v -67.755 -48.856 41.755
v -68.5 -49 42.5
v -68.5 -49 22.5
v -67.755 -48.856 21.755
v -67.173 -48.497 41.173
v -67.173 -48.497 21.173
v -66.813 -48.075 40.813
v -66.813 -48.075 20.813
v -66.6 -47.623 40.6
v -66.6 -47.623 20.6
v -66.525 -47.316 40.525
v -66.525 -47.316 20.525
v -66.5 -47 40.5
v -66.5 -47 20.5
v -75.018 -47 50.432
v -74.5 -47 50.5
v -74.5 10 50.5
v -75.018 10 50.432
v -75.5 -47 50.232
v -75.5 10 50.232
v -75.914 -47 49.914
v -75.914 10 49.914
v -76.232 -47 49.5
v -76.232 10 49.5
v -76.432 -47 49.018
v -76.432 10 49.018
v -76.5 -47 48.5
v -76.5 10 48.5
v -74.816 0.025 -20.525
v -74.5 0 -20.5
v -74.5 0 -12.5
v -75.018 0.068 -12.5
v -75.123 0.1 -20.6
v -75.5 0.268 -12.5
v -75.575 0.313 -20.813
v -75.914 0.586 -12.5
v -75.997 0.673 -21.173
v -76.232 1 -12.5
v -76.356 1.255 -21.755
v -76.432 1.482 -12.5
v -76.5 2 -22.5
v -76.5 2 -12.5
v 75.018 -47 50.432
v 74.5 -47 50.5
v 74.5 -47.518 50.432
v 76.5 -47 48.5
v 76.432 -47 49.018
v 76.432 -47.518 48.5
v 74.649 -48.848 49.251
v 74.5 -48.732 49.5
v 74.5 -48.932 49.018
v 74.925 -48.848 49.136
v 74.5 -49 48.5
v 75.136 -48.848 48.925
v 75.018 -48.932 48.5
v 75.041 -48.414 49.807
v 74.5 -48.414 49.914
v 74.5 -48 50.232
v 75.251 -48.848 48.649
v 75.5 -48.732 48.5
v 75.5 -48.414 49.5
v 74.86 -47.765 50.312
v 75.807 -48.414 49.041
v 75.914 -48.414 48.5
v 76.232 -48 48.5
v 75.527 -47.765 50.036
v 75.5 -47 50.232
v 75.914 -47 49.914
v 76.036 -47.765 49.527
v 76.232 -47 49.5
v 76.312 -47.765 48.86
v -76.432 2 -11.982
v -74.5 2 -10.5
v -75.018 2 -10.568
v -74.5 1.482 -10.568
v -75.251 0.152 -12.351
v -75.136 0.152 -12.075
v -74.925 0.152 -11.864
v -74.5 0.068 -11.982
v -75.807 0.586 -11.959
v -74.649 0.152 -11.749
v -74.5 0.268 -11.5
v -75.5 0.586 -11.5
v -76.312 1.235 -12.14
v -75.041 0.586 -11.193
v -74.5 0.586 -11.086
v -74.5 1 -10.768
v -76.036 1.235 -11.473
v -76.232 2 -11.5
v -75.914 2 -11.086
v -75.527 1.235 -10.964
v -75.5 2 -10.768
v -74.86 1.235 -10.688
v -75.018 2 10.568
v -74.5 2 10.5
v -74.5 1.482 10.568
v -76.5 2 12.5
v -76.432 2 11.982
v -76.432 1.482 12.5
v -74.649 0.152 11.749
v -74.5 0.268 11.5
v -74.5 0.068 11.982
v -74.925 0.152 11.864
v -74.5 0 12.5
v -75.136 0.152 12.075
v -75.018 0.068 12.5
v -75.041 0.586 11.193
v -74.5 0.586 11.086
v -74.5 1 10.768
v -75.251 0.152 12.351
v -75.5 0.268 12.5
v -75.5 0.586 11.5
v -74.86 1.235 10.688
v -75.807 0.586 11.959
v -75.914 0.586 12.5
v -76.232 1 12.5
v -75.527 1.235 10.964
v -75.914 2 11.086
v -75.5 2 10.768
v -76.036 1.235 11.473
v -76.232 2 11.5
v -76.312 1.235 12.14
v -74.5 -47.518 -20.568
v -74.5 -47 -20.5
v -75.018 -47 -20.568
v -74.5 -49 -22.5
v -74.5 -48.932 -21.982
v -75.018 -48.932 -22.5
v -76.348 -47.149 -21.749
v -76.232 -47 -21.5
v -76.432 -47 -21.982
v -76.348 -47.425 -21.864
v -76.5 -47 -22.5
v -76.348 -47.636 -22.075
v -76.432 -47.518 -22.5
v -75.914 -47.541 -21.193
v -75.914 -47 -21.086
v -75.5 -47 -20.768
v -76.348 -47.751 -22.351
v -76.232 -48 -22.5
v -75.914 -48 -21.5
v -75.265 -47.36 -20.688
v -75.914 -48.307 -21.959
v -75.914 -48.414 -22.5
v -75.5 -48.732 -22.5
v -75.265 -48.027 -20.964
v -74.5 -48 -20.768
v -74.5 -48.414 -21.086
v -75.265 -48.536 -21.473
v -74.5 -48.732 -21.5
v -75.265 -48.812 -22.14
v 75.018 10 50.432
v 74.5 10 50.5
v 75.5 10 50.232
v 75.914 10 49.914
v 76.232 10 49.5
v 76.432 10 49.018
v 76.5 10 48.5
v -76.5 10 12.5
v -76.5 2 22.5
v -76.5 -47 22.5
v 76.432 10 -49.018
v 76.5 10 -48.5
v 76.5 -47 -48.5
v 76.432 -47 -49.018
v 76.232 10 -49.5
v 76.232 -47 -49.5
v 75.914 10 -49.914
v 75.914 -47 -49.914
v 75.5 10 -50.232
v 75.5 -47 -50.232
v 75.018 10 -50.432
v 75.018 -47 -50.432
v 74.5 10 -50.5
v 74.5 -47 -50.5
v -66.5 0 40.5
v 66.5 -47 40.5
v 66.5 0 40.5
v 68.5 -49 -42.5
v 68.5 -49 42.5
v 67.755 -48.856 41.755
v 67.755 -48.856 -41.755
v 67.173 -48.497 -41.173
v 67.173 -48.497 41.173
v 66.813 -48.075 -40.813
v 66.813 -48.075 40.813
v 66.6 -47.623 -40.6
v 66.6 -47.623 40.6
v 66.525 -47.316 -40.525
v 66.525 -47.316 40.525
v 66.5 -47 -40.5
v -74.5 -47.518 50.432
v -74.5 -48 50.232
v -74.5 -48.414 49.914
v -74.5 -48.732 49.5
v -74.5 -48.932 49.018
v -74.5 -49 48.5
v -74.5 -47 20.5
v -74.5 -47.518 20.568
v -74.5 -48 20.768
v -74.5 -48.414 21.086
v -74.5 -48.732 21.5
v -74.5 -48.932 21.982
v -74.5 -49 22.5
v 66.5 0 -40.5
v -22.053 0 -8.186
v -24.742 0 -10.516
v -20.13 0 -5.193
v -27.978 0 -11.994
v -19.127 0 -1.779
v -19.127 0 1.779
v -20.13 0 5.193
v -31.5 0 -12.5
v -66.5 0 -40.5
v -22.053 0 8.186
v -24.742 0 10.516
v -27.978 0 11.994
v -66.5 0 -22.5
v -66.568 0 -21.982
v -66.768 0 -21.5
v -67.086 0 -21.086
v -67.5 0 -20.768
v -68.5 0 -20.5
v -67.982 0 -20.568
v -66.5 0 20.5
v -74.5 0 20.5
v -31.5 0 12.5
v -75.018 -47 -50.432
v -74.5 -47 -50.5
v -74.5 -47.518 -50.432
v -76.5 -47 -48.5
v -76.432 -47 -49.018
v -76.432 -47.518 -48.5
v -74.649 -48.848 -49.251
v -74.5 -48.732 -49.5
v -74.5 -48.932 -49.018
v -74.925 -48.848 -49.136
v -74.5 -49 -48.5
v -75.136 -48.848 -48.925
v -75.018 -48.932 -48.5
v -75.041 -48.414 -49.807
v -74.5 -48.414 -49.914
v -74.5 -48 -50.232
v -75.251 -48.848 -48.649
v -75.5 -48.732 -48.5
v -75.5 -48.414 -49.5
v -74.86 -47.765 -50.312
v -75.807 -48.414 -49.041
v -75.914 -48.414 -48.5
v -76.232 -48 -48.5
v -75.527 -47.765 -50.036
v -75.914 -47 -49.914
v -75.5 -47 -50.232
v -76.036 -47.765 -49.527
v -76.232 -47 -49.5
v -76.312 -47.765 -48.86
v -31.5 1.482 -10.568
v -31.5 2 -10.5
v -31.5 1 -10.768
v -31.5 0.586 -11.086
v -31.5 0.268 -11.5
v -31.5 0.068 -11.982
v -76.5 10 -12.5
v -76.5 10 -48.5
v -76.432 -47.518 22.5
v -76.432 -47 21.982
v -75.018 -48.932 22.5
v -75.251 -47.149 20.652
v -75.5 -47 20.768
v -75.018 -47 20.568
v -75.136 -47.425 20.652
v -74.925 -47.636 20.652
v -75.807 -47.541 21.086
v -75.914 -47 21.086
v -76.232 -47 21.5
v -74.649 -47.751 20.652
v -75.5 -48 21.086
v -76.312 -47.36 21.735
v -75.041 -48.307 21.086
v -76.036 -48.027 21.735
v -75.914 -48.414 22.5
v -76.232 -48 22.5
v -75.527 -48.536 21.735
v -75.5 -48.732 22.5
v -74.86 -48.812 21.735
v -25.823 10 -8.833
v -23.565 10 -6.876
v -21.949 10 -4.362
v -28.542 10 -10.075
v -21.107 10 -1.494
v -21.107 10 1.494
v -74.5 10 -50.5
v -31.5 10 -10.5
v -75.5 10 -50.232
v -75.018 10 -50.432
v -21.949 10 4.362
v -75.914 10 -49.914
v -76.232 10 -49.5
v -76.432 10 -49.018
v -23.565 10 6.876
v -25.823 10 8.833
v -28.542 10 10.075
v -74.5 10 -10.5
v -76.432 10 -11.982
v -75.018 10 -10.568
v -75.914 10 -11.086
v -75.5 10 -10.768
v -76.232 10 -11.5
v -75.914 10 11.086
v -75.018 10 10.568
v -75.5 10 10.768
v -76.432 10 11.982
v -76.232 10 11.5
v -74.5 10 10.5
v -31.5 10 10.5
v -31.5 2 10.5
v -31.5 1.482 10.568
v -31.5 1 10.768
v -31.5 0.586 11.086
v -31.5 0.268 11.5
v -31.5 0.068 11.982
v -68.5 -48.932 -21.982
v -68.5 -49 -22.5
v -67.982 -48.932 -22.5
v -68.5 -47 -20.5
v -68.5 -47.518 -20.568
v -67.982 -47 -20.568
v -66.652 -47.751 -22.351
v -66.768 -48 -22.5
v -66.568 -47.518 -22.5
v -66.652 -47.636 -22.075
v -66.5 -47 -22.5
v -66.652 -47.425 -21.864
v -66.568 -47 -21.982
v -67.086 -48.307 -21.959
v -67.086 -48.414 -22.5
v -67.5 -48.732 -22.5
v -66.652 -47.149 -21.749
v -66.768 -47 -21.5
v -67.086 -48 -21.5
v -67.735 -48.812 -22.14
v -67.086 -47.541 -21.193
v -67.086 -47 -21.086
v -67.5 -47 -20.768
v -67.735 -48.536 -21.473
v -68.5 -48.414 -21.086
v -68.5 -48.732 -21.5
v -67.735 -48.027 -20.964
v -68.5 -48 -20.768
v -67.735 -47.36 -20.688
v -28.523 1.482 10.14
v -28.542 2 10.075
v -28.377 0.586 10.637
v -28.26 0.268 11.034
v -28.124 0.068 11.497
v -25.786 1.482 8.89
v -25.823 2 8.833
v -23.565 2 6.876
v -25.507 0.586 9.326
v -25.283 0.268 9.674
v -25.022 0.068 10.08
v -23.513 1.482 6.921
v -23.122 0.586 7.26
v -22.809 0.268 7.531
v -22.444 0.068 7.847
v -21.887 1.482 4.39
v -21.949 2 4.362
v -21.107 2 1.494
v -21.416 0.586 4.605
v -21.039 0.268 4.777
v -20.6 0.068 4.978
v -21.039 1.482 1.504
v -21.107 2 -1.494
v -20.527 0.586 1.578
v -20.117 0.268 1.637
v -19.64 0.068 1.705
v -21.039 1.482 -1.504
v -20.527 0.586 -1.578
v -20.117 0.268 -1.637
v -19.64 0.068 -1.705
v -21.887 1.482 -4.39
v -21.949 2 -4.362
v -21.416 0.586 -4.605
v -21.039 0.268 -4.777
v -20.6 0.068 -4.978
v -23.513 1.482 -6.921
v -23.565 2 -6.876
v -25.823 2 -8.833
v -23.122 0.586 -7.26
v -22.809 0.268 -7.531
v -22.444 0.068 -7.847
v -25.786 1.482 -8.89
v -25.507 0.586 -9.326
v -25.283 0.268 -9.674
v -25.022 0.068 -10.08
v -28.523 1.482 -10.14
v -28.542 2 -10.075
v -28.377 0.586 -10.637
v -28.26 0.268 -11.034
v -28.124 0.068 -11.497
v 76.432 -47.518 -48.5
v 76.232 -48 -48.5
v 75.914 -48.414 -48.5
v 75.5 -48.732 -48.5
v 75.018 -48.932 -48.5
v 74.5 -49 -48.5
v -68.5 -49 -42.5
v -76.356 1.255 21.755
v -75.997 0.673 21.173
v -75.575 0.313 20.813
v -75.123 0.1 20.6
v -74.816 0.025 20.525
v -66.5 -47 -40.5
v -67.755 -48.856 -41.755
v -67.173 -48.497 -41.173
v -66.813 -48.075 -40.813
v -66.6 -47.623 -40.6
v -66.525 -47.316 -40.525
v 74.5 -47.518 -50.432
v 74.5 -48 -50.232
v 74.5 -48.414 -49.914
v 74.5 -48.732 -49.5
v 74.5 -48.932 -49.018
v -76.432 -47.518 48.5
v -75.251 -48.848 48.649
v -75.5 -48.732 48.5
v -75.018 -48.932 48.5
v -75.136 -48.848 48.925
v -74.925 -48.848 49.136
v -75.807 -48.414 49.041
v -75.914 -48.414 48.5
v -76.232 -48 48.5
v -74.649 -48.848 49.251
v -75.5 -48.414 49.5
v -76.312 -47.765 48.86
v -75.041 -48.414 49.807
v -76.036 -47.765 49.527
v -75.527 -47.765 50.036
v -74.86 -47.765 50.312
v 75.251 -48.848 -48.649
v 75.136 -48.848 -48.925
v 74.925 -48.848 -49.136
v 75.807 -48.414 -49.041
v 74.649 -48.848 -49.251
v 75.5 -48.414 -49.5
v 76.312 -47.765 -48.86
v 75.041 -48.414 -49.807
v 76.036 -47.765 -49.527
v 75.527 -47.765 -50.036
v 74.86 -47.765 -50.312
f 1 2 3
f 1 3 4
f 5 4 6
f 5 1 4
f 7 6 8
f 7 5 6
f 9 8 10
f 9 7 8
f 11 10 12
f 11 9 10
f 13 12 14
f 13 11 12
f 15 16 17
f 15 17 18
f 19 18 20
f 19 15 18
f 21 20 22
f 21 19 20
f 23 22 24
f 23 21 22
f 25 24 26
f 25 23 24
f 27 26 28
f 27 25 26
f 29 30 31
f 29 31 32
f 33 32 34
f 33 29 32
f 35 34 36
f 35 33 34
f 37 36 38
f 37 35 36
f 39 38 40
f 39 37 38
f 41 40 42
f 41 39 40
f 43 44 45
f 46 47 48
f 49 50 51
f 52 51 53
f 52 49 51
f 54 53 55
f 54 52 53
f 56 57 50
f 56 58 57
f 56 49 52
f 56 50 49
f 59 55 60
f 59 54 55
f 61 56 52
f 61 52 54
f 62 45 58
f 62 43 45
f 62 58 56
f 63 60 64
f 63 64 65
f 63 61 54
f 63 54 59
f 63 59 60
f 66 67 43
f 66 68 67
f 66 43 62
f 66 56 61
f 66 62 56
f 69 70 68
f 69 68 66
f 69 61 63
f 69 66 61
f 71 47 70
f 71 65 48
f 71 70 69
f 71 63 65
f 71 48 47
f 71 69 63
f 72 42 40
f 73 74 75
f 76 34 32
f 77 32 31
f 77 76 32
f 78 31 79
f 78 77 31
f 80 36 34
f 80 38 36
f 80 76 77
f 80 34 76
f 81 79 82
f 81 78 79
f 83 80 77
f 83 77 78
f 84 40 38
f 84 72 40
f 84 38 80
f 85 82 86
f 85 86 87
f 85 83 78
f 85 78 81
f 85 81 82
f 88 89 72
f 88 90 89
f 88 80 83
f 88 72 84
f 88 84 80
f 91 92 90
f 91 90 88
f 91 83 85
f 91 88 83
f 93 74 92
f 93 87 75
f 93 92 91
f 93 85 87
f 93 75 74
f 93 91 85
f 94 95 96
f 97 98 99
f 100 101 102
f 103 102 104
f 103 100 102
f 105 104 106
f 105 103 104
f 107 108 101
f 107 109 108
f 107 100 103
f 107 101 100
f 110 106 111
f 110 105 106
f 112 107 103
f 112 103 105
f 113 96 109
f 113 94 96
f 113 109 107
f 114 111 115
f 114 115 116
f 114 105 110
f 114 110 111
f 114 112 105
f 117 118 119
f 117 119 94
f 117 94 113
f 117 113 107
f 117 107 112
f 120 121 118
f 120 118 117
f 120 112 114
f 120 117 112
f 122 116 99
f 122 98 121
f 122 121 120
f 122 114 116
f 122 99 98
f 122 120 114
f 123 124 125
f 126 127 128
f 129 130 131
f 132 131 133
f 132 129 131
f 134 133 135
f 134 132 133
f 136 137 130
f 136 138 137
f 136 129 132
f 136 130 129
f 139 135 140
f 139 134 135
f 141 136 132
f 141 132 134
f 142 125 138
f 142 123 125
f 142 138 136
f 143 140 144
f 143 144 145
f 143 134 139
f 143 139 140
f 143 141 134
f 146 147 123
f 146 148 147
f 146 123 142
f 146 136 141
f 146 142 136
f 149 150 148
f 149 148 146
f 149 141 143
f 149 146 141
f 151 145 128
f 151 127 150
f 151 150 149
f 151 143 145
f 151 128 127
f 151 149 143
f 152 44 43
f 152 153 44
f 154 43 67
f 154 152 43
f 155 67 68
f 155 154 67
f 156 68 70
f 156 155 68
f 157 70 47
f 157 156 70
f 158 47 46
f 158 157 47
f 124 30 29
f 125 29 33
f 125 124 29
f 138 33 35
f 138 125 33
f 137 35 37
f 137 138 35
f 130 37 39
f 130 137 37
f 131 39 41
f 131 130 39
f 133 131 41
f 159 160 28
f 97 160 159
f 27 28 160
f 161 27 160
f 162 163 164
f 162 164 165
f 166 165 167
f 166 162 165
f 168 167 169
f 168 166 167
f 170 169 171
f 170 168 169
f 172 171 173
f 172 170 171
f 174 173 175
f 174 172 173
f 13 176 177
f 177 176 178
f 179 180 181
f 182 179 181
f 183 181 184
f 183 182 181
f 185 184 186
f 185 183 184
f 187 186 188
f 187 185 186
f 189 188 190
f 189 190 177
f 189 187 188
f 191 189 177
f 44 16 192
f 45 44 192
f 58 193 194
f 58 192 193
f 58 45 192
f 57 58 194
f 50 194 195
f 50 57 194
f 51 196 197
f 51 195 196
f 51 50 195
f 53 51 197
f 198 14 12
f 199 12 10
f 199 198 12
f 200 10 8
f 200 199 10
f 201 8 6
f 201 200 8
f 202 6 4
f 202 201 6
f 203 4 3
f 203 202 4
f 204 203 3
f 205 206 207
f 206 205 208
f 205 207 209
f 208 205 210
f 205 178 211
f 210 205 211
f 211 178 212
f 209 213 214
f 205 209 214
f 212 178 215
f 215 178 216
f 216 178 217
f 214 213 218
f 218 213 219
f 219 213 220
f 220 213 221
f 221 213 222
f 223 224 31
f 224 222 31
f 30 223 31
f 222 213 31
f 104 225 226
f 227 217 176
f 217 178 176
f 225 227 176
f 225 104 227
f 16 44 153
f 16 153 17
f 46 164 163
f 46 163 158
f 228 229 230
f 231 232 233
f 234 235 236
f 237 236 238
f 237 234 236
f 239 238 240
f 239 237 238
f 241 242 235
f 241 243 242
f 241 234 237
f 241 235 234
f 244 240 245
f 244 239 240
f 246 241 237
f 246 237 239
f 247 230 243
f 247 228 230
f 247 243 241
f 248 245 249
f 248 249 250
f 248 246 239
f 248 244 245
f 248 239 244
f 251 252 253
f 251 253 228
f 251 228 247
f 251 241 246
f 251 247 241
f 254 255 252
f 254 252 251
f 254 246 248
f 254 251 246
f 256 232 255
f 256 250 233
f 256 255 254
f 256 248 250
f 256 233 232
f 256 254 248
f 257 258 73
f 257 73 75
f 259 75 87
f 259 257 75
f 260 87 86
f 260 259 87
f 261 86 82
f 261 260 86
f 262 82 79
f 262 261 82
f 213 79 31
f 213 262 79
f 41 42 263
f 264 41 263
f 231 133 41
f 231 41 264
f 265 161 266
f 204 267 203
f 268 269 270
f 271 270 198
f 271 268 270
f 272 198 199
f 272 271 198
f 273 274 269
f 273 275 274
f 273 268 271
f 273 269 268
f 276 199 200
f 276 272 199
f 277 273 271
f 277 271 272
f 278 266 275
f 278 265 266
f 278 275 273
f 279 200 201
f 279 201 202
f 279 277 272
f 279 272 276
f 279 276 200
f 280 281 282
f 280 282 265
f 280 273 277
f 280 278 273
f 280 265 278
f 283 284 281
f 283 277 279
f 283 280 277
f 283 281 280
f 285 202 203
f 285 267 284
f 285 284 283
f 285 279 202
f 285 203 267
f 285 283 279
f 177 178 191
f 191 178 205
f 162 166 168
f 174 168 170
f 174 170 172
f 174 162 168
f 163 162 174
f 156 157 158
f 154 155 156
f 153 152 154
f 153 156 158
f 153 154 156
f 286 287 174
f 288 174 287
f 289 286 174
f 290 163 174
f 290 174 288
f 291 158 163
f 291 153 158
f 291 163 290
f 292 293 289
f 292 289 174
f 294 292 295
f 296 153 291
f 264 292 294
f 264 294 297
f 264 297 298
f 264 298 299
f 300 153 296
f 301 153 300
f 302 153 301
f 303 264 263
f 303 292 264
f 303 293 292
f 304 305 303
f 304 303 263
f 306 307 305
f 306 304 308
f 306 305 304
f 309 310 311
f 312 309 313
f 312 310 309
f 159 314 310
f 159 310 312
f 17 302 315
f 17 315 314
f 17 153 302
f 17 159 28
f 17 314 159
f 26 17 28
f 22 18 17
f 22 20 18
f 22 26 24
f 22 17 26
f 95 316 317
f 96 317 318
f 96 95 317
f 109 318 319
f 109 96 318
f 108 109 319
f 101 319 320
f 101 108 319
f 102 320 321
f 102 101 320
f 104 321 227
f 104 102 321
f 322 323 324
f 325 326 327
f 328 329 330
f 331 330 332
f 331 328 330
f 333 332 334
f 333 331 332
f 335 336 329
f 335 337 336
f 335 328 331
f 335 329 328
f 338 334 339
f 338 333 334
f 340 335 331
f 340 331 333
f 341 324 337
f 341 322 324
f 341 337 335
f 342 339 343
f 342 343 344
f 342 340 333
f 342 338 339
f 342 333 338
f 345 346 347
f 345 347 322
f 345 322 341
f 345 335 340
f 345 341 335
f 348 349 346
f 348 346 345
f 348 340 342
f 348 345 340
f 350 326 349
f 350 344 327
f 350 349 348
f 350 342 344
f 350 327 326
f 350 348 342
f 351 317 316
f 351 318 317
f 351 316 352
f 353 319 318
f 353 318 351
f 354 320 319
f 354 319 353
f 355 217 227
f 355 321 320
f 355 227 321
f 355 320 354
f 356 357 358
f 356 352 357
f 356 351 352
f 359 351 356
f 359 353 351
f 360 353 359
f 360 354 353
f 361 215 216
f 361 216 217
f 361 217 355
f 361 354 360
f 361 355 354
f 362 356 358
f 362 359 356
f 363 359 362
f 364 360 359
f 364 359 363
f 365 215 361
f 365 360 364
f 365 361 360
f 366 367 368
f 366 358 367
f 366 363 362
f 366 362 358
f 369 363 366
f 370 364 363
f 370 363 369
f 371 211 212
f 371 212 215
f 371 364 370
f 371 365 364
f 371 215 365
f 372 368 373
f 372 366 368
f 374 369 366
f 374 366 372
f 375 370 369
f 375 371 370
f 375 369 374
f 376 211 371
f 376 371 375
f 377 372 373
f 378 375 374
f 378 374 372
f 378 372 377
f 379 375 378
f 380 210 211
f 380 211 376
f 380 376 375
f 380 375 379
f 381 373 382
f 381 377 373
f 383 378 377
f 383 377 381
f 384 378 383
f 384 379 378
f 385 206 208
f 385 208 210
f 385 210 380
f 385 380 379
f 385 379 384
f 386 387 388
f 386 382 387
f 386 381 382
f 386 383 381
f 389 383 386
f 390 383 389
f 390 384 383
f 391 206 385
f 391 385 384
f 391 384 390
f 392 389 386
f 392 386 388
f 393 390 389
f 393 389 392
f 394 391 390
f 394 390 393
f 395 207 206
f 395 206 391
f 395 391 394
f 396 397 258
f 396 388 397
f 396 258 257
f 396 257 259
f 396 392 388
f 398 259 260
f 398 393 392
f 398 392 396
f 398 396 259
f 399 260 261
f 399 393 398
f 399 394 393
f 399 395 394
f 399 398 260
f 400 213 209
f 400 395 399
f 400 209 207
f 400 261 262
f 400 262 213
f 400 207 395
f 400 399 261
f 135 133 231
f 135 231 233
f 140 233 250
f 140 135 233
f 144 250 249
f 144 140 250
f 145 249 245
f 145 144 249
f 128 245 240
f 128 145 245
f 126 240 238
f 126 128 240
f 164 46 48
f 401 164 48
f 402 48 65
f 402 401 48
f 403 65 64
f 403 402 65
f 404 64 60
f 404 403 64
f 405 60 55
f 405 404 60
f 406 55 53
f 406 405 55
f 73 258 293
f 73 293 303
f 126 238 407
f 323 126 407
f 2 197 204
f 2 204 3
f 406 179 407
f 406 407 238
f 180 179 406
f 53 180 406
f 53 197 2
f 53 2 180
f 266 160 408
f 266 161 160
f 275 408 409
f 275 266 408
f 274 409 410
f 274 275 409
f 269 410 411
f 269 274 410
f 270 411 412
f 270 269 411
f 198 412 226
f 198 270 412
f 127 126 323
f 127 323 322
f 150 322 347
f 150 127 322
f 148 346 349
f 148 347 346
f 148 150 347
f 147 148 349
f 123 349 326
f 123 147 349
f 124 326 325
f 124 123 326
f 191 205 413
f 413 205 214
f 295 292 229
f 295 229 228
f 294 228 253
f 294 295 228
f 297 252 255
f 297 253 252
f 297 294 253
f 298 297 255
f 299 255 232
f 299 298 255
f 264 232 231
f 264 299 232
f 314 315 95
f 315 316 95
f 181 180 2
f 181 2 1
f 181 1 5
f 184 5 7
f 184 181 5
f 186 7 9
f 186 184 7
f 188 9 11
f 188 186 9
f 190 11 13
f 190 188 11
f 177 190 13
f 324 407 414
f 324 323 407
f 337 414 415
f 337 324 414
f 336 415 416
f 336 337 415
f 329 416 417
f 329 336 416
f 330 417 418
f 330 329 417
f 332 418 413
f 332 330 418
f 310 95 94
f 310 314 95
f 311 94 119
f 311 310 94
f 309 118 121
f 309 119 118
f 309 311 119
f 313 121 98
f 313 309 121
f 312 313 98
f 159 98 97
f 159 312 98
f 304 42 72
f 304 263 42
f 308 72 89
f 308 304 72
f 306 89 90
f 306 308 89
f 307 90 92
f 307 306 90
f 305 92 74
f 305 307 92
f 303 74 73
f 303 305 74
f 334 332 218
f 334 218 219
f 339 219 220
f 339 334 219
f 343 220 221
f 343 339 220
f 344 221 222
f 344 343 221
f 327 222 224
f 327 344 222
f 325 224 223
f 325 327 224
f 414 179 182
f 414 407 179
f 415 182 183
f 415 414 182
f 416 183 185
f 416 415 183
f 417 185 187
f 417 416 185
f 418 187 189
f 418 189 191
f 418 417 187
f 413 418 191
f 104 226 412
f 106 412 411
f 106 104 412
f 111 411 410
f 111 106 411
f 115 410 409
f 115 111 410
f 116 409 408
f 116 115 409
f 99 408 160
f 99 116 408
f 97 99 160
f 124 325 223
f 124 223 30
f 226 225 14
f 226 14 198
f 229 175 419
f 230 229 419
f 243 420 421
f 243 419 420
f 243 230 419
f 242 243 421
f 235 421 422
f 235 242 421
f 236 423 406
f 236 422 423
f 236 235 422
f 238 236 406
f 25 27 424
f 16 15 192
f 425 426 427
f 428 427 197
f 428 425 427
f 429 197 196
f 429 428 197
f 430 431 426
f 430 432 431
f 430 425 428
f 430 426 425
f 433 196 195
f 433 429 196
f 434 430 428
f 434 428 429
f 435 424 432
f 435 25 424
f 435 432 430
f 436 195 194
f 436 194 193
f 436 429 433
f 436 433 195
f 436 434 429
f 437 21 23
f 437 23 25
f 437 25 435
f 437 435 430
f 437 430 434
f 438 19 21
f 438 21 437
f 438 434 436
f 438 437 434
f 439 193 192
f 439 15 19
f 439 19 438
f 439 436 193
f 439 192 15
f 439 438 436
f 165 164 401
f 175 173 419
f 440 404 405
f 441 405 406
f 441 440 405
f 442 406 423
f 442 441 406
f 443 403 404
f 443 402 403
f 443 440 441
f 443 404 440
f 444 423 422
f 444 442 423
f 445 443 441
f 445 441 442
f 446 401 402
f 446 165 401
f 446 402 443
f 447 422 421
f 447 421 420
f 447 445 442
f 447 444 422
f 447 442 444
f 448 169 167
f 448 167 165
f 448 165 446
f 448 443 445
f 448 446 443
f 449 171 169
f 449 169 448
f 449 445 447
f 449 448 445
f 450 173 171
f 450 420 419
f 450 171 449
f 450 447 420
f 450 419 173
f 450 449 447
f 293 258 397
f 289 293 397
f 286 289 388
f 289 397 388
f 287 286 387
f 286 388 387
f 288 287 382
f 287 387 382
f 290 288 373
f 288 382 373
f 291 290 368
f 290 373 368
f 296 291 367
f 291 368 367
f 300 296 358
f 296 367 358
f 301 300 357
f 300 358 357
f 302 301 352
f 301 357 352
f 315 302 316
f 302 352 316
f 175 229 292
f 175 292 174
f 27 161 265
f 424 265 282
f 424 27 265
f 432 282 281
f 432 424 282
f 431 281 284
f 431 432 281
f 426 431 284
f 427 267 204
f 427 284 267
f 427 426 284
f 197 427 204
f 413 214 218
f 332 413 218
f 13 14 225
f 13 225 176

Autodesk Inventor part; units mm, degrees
ref_plane "YZ Plane" through (0, 0, 0) normal (1, 0, 0) x (0, 1, 0)
ref_plane "XZ Plane" through (0, 0, 0) normal (0, 1, 0) x (-1, 0, 0)
ref_plane "XY Plane" through (0, 0, 0) normal (0, 0, 1) x (1, 0, 0)
sketch "草圖1" plane through (0, 0, 0) normal (0, 1, 0) x (-1, 0, 0)
  line L0 (-76.5, 50.5) -> (76.5, 50.5)
  line L1 (76.5, 50.5) -> (76.5, -50.5)
  line L2 (76.5, -50.5) -> (-76.5, -50.5)
  line L3 (-76.5, -50.5) -> (-76.5, 50.5)
  line L4 (-76.5, 50.5) -> (76.5, -50.5) construction
  line L5 (76.5, 50.5) -> (-76.5, -50.5) construction
  circle A0 centre (31.5, 0) radius 10.5
  line L6 (31.5, 10.5) -> (76.5, 10.5)
  line L7 (31.5, -10.5) -> (76.5, -10.5)
  point P0 (0, 0)
  point P1 (0, 0)
  dimension "d0" = 153
  dimension "d1" = 101
  dimension "d2" = 45
  dimension "d3" = 21
extrude "擠出1" add sketch "草圖1" along normal blind 10 contours L0 L1 L6 A0 L7 L2 L3
sketch "草圖2" plane through (0, 0, 0) normal (0, -1, 0) x (1, 0, 0)
  line L0 (76.5, 50.5) -> (76.5, -50.5) projected
  line L1 (-76.5, 50.5) -> (76.5, 50.5) projected
  line L2 (-76.5, 10.5) -> (-76.5, 50.5) projected
  line L3 (-31.5, 10.5) -> (-76.5, 10.5) projected
  arc A0 (-31.5, -10.5) -> (-31.5, 10.5) centre (-31.5, 0) ccw projected
  line L4 (-76.5, -10.5) -> (-31.5, -10.5) projected
  line L5 (-76.5, -50.5) -> (-76.5, -10.5) projected
  line L6 (76.5, -50.5) -> (-76.5, -50.5) projected
  line L7 (66.5, 40.5) -> (66.5, -40.5)
  line L8 (66.5, -40.5) -> (-66.5, -40.5)
  line L9 (-66.5, -40.5) -> (-66.5, -20.5)
  line L10 (-66.5, -20.5) -> (-31.5, -20.5)
  arc A1 (-31.5, -20.5) -> (-31.5, 20.5) centre (-31.5, 0) ccw
  line L11 (-31.5, 20.5) -> (-66.5, 20.5)
  line L12 (-66.5, 20.5) -> (-66.5, 40.5)
  line L13 (-66.5, 40.5) -> (66.5, 40.5)
  line L14 (-66.5, 20.5) -> (-76.5, 20.5)
  line L15 (-66.5, -20.5) -> (-76.5, -20.5)
  line L16 (-76.5, -50.5) -> (-76.5, -10.5) projected
  point P0 (0, 0)
  dimension "d6" = 10
extrude "擠出2" add sketch "草圖2" along normal blind 49 contours L0 L6 L5 L15 L9 L8 L7 L13 L12 L14 L2 L1
fillet "圓角1" radius 2 26 edges at (76.5, -19.5, 50.5) (-76.5, -19.5, 50.5) (-76.5, 5, -10.5) (-76.5, 5, 10.5) (-76.5, -19.5, -50.5) (76.5, -19.5, -50.5) (0, -49, 50.5) (0, -49, 40.5) (-76.5, -49, 35.5) (-66.5, -49, 30.5) (-71.5, -49, -20.5) (-71.5, -49, 20.5) (-76.5, -24.5, -20.5) (-66.5, -24.5, -20.5) (-76.5, -49, -35.5) (-66.5, -49, -30.5) (0, -49, -50.5) (0, -49, -40.5) (-76.5, 0, -15.5) (-76.5, 0, 15.5) (-76.5, -24.5, 20.5) (-54, 0, 10.5) (-54, 0, -10.5) (-21, 0, 0) (66.5, -49, 0) (76.5, -49, 0)
properties part number "麥克風蓋"
